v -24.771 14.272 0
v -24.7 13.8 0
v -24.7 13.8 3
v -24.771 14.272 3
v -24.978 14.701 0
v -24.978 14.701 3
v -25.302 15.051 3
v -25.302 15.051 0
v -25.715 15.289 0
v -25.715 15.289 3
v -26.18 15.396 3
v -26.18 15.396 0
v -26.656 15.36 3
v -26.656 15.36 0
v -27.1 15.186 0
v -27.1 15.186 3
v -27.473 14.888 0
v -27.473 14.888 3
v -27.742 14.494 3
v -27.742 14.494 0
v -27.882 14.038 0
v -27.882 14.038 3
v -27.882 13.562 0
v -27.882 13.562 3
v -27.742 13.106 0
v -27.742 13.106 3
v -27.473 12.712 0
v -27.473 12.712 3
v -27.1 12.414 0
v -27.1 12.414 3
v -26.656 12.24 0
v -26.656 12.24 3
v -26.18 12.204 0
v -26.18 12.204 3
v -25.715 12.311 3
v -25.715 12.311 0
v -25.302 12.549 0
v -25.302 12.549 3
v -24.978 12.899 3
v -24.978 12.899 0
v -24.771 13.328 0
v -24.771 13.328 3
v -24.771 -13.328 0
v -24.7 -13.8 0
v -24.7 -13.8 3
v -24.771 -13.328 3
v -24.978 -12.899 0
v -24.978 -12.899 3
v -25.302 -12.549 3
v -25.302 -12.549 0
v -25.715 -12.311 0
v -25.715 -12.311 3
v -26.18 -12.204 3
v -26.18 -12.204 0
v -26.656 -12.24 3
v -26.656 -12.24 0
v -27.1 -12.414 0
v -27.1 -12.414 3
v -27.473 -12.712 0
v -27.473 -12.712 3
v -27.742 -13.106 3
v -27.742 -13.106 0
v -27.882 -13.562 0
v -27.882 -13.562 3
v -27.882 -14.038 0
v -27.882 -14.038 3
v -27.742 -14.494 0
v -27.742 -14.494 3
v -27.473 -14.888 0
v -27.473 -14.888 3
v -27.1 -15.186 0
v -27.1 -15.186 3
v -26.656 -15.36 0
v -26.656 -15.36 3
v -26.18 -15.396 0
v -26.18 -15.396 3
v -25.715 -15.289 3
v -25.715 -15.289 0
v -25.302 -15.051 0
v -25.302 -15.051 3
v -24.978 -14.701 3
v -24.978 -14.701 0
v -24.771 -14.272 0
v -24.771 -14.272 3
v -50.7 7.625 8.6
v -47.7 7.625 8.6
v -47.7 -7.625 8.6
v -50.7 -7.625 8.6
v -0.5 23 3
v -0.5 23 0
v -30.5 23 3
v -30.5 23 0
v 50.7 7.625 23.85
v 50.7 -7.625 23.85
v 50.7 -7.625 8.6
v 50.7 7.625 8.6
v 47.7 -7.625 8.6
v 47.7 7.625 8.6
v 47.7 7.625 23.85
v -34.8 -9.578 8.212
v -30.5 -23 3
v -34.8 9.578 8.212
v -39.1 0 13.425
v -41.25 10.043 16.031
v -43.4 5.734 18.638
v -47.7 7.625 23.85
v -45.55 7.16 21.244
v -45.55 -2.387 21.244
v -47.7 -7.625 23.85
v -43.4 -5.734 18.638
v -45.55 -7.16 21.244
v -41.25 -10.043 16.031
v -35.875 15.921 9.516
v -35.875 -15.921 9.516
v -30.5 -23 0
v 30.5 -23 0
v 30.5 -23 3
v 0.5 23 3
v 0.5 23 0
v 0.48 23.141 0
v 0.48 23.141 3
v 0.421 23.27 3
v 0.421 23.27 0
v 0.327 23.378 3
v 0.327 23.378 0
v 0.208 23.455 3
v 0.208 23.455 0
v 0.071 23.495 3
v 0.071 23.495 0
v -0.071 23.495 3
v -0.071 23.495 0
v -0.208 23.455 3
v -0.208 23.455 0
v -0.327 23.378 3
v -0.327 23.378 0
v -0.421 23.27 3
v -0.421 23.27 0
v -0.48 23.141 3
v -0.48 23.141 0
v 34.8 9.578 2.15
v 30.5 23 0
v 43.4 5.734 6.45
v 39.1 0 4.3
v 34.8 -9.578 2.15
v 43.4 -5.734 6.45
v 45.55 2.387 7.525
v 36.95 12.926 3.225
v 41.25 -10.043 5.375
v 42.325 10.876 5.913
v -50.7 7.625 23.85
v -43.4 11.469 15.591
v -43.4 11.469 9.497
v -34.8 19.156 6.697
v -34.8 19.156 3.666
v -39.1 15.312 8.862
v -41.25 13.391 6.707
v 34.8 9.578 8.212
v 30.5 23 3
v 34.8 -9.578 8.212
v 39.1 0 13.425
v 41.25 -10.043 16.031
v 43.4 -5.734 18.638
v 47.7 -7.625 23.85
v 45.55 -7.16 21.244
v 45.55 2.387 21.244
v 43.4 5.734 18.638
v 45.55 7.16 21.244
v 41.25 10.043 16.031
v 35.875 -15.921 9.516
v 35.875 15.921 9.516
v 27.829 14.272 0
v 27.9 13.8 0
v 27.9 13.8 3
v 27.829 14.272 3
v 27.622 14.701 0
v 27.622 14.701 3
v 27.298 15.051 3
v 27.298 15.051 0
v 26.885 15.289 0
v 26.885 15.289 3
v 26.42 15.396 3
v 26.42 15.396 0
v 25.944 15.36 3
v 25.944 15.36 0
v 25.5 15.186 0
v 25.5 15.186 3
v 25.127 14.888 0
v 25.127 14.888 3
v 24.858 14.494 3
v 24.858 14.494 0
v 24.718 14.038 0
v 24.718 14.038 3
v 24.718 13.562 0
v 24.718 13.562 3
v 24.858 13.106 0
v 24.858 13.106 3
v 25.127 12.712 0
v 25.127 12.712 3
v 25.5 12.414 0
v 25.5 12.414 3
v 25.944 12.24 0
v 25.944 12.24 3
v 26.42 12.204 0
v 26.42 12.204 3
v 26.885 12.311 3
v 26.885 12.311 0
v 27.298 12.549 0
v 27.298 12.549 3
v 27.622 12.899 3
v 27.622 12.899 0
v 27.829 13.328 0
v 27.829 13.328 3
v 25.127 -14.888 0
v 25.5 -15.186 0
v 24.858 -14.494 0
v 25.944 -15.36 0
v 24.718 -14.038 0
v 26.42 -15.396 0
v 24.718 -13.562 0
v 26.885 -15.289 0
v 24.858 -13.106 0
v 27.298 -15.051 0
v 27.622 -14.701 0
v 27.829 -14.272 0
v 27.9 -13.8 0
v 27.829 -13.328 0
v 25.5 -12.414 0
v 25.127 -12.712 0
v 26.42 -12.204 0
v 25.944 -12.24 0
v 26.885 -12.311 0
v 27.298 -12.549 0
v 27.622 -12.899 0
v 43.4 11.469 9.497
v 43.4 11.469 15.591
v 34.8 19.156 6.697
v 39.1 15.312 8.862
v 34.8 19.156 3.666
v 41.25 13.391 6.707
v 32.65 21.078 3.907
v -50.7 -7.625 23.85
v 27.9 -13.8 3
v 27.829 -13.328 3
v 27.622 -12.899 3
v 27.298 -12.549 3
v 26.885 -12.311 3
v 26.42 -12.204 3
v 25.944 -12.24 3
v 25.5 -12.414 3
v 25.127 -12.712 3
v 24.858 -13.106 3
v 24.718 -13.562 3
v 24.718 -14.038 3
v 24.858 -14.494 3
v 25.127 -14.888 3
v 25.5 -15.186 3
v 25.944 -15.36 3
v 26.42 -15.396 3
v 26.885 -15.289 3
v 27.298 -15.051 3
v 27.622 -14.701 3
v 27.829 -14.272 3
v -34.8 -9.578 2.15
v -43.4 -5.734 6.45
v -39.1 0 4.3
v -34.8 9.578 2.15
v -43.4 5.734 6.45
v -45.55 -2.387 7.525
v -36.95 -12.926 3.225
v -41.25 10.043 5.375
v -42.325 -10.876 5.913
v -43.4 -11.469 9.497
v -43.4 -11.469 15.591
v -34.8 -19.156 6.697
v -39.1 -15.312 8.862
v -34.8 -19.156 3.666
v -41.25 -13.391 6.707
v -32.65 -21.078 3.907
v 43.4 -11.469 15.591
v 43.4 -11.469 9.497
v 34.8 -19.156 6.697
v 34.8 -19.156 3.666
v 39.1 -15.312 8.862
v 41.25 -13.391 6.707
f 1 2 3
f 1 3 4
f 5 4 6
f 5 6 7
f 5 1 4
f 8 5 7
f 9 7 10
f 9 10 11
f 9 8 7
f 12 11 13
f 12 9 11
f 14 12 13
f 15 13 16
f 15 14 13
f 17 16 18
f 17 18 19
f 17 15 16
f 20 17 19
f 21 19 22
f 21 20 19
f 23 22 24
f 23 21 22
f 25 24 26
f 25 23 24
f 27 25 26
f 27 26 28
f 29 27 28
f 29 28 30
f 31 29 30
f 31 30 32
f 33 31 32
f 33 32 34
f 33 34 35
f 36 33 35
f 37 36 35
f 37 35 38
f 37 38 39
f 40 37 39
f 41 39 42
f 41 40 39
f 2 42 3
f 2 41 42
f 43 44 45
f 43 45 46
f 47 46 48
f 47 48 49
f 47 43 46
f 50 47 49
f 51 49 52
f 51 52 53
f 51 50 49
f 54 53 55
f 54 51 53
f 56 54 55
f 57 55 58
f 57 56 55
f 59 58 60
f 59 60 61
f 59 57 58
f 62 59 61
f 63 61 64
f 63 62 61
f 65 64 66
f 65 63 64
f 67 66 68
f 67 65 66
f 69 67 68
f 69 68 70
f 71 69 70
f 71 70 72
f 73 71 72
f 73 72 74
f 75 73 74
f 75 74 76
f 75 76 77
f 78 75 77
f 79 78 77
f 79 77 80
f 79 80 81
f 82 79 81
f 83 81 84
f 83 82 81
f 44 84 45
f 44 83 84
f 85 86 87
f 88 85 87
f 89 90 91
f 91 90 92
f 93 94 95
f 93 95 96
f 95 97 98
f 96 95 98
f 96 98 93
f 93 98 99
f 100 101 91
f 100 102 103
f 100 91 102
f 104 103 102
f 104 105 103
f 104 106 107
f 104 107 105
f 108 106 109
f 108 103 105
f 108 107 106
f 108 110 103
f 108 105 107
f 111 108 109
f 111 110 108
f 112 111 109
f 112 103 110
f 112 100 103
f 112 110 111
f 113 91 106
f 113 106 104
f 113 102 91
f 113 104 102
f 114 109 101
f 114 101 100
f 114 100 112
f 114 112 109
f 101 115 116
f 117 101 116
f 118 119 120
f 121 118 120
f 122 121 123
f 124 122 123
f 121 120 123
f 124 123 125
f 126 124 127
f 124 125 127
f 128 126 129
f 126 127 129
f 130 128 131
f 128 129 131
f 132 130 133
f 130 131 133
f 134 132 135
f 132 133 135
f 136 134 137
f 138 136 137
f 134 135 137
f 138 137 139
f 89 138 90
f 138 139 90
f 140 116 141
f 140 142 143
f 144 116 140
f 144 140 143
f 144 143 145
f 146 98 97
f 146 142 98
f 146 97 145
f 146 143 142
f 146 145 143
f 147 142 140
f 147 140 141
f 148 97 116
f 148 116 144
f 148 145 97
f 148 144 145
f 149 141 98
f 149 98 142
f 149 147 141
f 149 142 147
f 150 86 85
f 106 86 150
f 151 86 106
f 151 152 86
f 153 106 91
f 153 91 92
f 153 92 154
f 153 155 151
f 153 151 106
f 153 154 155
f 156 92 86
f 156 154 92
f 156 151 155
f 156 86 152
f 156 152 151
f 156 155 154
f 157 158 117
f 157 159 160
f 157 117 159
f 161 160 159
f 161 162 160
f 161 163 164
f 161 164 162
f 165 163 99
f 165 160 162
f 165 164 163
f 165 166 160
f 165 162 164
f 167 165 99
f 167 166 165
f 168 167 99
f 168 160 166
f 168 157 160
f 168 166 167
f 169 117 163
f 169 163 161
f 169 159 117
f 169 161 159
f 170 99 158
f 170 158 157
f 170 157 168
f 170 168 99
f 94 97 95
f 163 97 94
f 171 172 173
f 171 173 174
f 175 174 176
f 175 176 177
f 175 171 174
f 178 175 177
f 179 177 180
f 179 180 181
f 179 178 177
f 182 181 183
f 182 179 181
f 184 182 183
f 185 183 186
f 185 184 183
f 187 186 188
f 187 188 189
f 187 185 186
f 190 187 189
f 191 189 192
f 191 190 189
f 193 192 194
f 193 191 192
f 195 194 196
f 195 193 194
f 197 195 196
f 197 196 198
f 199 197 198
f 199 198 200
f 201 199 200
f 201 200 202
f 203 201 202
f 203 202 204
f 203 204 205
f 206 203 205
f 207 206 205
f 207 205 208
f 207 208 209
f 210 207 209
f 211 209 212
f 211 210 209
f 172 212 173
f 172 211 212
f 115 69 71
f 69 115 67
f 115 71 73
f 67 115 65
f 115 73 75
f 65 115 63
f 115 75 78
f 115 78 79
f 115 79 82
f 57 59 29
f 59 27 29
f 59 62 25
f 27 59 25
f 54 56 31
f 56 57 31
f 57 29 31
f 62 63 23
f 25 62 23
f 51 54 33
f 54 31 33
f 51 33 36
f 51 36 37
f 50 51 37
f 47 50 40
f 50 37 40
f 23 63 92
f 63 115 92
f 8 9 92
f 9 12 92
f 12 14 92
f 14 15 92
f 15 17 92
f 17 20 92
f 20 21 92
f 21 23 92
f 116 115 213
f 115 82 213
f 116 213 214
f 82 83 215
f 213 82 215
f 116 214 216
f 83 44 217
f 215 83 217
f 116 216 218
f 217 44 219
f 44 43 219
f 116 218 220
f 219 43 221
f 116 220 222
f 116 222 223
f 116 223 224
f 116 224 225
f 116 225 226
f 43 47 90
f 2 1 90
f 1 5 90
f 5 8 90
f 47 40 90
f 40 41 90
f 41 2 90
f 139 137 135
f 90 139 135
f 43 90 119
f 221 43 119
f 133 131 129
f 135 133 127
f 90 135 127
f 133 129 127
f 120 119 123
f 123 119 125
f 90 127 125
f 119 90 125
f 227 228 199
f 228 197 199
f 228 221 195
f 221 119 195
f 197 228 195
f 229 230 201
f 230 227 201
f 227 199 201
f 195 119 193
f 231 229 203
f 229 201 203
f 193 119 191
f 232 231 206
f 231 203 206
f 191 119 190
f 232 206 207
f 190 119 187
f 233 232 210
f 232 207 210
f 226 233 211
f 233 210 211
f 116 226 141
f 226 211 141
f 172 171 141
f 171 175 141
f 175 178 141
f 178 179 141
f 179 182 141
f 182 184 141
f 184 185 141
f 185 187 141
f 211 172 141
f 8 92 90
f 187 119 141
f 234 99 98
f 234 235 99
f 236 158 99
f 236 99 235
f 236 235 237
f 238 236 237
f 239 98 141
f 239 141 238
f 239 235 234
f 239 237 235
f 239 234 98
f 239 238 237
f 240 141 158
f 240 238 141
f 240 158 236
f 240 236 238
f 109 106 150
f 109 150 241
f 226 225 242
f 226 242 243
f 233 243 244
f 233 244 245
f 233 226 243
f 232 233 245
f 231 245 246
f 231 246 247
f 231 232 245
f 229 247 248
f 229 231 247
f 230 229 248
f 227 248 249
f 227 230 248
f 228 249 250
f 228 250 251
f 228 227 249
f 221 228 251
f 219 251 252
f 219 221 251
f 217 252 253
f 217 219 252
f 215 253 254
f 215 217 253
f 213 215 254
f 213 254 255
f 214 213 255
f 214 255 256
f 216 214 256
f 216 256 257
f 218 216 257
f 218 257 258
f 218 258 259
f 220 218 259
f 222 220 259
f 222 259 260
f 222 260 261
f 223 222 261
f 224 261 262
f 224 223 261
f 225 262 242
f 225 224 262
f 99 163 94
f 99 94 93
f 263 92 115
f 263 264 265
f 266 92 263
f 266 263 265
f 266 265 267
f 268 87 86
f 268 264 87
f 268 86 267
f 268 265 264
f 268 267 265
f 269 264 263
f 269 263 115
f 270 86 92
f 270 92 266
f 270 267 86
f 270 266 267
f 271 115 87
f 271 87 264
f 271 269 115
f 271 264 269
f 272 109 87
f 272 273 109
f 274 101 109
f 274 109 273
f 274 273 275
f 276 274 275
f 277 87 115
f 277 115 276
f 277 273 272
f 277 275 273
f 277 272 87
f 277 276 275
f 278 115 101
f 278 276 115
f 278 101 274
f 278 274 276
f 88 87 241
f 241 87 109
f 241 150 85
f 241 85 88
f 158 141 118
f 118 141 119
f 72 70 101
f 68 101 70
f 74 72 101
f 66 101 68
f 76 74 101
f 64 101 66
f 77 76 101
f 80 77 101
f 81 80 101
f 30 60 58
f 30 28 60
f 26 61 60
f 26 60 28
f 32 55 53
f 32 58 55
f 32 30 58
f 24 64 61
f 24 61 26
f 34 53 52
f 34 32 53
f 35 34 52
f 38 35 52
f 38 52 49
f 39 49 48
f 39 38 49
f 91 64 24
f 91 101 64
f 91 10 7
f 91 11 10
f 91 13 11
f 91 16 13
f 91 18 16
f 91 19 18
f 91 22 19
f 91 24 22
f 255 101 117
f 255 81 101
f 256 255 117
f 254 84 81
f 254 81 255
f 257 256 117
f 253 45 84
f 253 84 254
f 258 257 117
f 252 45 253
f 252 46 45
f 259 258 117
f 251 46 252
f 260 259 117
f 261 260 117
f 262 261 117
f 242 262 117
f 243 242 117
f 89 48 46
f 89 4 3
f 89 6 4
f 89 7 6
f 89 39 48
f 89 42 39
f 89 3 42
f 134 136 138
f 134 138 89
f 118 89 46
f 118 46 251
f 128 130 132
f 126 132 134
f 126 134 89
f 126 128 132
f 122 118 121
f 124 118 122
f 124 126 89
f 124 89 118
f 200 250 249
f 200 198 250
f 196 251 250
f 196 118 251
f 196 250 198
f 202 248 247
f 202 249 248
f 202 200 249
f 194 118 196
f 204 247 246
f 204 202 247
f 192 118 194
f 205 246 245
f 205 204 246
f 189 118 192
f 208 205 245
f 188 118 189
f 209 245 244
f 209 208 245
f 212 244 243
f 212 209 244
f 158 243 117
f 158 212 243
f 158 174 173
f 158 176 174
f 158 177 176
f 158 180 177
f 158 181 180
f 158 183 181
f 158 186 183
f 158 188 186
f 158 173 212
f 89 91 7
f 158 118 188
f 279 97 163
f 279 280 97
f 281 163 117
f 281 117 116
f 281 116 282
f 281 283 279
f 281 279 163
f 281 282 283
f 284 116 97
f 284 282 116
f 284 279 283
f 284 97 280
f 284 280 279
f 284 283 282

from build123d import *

# Parameters (mm, degrees)
F0_R       = 1.6
F1_DEPTH   = 3
F3_W       = 15.25
F3_H       = 15.25
F4_DEPTH   = 3
F4_FACE_W  = 15.25
F4_FACE_H  = 15.25
F1_FACE_W  = 46
F1_FACE_H  = 3
F7_W       = 15.25
F7_H       = 15.25
F8_DEPTH   = 3
F8_FACE_W  = 15.25
F8_FACE_H  = 15.25
F1_FACE1_W = 46
F1_FACE1_H = 3


with BuildPart() as f1:
    # F0 (on Top) → F1 (new body)
    with BuildSketch(Plane.XY):
        with BuildLine():
            ThreePointArc((-0.5, 23), (0, 22.5), (0.5, 23))
            Line((0.5, 23), (-0.5, 23))
        make_face()
        with BuildLine():
            Line((-0.5, 23), (0.5, 23))
            ThreePointArc((0.5, 23), (0, 23.5), (-0.5, 23))
        make_face()
        with BuildLine():
            Line((30.5, 23), (0.5, 23))
            ThreePointArc((0.5, 23), (0, 22.5), (-0.5, 23))
            Line((-0.5, 23), (-30.5, 23))
            Line((-30.5, 23), (-30.5, -23))
            Line((-30.5, -23), (30.5, -23))
            Line((30.5, -23), (30.5, 23))
        make_face()
        with Locations((-26.3, -13.8)):
            Circle(F0_R, mode=Mode.SUBTRACT)
        with Locations((26.3, -13.8)):
            Circle(F0_R, mode=Mode.SUBTRACT)
        with Locations((-26.3, 13.8)):
            Circle(F0_R, mode=Mode.SUBTRACT)
        with Locations((26.3, 13.8)):
            Circle(F0_R, mode=Mode.SUBTRACT)
    extrude(amount=F1_DEPTH)



with BuildPart() as f4:
    # F3 (on offset) → F4 (new body)
    with BuildSketch(Plane.YZ.offset(47.7)):
        with Locations((0, 16.225)):
            Rectangle(F3_W, F3_H)
    extrude(amount=F4_DEPTH)


with BuildPart() as f1_1:
    add(f1.part)

    add(f4.part)  # F5 merges F4
    # F4_face (on face) → F5 section 0
    with BuildSketch(Plane(origin=(47.7, 0, 16.225), x_dir=(0, 1, 0), z_dir=(-1, 0, 0))):
        Rectangle(F4_FACE_W, F4_FACE_H)
    # F1_face (on face) → F5 section 1
    with BuildSketch(Plane(origin=(30.5, 0, 1.5), x_dir=(0, 1, 0), z_dir=(1, 0, 0))):
        Rectangle(F1_FACE_W, F1_FACE_H)
    loft()



with BuildPart() as f8:
    # F7 (on offset) → F8 (new body)
    with BuildSketch(Plane(origin=(-47.7, 0, 0), x_dir=(0, -1, 0), z_dir=(-1, 0, 0))):
        with Locations((0, 16.225)):
            Rectangle(F7_W, F7_H)
    extrude(amount=F8_DEPTH)


with BuildPart() as f1_2:
    add(f1_1.part)

    add(f8.part)  # F9 merges F8
    # F8_face (on face) → F9 section 0
    with BuildSketch(Plane(origin=(-47.7, 0, 16.225), x_dir=(0, -1, 0), z_dir=(1, 0, 0))):
        Rectangle(F8_FACE_W, F8_FACE_H)
    # F1_face1 (on face) → F9 section 1
    with BuildSketch(Plane(origin=(-30.5, 0, 1.5), x_dir=(0, -1, 0), z_dir=(-1, 0, 0))):
        Rectangle(F1_FACE1_W, F1_FACE1_H)
    loft()


solid = f1_2.part
